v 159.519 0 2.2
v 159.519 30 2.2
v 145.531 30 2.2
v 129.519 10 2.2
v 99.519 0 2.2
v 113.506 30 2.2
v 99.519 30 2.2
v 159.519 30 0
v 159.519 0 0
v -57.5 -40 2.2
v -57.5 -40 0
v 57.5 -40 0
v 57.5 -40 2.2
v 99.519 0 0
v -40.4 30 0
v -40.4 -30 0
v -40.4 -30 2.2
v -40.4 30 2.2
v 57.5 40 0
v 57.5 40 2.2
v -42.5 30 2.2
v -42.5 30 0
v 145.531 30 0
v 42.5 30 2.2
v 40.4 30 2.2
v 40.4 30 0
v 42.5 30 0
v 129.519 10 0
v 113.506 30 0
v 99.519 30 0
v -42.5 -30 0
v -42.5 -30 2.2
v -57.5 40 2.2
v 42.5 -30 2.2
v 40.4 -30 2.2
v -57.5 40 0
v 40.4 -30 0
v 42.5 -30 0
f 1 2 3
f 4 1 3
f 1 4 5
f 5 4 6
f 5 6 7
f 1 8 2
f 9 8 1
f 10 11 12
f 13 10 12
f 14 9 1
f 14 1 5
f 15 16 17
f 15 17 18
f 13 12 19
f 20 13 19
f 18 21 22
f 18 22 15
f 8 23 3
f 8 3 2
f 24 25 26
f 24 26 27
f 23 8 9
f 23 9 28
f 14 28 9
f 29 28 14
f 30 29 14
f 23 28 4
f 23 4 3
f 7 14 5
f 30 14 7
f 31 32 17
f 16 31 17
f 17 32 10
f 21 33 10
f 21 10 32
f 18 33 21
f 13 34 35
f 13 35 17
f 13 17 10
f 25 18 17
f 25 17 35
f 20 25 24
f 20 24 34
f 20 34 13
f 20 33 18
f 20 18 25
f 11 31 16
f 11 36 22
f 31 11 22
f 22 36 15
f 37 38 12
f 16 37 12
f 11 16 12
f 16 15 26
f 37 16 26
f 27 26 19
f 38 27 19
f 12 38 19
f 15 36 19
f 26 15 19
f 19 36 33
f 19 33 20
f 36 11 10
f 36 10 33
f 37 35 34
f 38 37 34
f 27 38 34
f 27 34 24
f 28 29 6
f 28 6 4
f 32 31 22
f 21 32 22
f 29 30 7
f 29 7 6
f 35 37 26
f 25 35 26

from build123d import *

# Parameters (mm, degrees)
SKETCH1_W             = 115
SKETCH1_H             = 80
SKETCH1_W_2           = 2.1
SKETCH1_H_2           = 60
BOSS_EXTRUDE1_DEPTH   = 2.2
BOSS_EXTRUDE1_2_DEPTH = 2.2


with BuildPart() as part:
    # Sketch1 → Boss-Extrude1 (new body)
    with BuildSketch(Plane.XY):
        Rectangle(SKETCH1_W, SKETCH1_H)
        with Locations((41.45, 0)):
            Rectangle(SKETCH1_W_2, SKETCH1_H_2, mode=Mode.SUBTRACT)
        with Locations((-41.45, 0)):
            Rectangle(SKETCH1_W_2, SKETCH1_H_2, mode=Mode.SUBTRACT)
    extrude(amount=BOSS_EXTRUDE1_DEPTH)


with BuildPart() as body_2:
    # Sketch1 → Boss-Extrude1 2 (new body)
    with BuildSketch(Plane.XY):
        Polygon((113.505737111, 30), (129.518552491, 10), (145.531367872, 30), (159.518552491, 30), (159.518552491, 0), (99.518552491, 0), (99.518552491, 30), align=None)
    extrude(amount=BOSS_EXTRUDE1_2_DEPTH)


solid = Compound([part.part, body_2.part])
